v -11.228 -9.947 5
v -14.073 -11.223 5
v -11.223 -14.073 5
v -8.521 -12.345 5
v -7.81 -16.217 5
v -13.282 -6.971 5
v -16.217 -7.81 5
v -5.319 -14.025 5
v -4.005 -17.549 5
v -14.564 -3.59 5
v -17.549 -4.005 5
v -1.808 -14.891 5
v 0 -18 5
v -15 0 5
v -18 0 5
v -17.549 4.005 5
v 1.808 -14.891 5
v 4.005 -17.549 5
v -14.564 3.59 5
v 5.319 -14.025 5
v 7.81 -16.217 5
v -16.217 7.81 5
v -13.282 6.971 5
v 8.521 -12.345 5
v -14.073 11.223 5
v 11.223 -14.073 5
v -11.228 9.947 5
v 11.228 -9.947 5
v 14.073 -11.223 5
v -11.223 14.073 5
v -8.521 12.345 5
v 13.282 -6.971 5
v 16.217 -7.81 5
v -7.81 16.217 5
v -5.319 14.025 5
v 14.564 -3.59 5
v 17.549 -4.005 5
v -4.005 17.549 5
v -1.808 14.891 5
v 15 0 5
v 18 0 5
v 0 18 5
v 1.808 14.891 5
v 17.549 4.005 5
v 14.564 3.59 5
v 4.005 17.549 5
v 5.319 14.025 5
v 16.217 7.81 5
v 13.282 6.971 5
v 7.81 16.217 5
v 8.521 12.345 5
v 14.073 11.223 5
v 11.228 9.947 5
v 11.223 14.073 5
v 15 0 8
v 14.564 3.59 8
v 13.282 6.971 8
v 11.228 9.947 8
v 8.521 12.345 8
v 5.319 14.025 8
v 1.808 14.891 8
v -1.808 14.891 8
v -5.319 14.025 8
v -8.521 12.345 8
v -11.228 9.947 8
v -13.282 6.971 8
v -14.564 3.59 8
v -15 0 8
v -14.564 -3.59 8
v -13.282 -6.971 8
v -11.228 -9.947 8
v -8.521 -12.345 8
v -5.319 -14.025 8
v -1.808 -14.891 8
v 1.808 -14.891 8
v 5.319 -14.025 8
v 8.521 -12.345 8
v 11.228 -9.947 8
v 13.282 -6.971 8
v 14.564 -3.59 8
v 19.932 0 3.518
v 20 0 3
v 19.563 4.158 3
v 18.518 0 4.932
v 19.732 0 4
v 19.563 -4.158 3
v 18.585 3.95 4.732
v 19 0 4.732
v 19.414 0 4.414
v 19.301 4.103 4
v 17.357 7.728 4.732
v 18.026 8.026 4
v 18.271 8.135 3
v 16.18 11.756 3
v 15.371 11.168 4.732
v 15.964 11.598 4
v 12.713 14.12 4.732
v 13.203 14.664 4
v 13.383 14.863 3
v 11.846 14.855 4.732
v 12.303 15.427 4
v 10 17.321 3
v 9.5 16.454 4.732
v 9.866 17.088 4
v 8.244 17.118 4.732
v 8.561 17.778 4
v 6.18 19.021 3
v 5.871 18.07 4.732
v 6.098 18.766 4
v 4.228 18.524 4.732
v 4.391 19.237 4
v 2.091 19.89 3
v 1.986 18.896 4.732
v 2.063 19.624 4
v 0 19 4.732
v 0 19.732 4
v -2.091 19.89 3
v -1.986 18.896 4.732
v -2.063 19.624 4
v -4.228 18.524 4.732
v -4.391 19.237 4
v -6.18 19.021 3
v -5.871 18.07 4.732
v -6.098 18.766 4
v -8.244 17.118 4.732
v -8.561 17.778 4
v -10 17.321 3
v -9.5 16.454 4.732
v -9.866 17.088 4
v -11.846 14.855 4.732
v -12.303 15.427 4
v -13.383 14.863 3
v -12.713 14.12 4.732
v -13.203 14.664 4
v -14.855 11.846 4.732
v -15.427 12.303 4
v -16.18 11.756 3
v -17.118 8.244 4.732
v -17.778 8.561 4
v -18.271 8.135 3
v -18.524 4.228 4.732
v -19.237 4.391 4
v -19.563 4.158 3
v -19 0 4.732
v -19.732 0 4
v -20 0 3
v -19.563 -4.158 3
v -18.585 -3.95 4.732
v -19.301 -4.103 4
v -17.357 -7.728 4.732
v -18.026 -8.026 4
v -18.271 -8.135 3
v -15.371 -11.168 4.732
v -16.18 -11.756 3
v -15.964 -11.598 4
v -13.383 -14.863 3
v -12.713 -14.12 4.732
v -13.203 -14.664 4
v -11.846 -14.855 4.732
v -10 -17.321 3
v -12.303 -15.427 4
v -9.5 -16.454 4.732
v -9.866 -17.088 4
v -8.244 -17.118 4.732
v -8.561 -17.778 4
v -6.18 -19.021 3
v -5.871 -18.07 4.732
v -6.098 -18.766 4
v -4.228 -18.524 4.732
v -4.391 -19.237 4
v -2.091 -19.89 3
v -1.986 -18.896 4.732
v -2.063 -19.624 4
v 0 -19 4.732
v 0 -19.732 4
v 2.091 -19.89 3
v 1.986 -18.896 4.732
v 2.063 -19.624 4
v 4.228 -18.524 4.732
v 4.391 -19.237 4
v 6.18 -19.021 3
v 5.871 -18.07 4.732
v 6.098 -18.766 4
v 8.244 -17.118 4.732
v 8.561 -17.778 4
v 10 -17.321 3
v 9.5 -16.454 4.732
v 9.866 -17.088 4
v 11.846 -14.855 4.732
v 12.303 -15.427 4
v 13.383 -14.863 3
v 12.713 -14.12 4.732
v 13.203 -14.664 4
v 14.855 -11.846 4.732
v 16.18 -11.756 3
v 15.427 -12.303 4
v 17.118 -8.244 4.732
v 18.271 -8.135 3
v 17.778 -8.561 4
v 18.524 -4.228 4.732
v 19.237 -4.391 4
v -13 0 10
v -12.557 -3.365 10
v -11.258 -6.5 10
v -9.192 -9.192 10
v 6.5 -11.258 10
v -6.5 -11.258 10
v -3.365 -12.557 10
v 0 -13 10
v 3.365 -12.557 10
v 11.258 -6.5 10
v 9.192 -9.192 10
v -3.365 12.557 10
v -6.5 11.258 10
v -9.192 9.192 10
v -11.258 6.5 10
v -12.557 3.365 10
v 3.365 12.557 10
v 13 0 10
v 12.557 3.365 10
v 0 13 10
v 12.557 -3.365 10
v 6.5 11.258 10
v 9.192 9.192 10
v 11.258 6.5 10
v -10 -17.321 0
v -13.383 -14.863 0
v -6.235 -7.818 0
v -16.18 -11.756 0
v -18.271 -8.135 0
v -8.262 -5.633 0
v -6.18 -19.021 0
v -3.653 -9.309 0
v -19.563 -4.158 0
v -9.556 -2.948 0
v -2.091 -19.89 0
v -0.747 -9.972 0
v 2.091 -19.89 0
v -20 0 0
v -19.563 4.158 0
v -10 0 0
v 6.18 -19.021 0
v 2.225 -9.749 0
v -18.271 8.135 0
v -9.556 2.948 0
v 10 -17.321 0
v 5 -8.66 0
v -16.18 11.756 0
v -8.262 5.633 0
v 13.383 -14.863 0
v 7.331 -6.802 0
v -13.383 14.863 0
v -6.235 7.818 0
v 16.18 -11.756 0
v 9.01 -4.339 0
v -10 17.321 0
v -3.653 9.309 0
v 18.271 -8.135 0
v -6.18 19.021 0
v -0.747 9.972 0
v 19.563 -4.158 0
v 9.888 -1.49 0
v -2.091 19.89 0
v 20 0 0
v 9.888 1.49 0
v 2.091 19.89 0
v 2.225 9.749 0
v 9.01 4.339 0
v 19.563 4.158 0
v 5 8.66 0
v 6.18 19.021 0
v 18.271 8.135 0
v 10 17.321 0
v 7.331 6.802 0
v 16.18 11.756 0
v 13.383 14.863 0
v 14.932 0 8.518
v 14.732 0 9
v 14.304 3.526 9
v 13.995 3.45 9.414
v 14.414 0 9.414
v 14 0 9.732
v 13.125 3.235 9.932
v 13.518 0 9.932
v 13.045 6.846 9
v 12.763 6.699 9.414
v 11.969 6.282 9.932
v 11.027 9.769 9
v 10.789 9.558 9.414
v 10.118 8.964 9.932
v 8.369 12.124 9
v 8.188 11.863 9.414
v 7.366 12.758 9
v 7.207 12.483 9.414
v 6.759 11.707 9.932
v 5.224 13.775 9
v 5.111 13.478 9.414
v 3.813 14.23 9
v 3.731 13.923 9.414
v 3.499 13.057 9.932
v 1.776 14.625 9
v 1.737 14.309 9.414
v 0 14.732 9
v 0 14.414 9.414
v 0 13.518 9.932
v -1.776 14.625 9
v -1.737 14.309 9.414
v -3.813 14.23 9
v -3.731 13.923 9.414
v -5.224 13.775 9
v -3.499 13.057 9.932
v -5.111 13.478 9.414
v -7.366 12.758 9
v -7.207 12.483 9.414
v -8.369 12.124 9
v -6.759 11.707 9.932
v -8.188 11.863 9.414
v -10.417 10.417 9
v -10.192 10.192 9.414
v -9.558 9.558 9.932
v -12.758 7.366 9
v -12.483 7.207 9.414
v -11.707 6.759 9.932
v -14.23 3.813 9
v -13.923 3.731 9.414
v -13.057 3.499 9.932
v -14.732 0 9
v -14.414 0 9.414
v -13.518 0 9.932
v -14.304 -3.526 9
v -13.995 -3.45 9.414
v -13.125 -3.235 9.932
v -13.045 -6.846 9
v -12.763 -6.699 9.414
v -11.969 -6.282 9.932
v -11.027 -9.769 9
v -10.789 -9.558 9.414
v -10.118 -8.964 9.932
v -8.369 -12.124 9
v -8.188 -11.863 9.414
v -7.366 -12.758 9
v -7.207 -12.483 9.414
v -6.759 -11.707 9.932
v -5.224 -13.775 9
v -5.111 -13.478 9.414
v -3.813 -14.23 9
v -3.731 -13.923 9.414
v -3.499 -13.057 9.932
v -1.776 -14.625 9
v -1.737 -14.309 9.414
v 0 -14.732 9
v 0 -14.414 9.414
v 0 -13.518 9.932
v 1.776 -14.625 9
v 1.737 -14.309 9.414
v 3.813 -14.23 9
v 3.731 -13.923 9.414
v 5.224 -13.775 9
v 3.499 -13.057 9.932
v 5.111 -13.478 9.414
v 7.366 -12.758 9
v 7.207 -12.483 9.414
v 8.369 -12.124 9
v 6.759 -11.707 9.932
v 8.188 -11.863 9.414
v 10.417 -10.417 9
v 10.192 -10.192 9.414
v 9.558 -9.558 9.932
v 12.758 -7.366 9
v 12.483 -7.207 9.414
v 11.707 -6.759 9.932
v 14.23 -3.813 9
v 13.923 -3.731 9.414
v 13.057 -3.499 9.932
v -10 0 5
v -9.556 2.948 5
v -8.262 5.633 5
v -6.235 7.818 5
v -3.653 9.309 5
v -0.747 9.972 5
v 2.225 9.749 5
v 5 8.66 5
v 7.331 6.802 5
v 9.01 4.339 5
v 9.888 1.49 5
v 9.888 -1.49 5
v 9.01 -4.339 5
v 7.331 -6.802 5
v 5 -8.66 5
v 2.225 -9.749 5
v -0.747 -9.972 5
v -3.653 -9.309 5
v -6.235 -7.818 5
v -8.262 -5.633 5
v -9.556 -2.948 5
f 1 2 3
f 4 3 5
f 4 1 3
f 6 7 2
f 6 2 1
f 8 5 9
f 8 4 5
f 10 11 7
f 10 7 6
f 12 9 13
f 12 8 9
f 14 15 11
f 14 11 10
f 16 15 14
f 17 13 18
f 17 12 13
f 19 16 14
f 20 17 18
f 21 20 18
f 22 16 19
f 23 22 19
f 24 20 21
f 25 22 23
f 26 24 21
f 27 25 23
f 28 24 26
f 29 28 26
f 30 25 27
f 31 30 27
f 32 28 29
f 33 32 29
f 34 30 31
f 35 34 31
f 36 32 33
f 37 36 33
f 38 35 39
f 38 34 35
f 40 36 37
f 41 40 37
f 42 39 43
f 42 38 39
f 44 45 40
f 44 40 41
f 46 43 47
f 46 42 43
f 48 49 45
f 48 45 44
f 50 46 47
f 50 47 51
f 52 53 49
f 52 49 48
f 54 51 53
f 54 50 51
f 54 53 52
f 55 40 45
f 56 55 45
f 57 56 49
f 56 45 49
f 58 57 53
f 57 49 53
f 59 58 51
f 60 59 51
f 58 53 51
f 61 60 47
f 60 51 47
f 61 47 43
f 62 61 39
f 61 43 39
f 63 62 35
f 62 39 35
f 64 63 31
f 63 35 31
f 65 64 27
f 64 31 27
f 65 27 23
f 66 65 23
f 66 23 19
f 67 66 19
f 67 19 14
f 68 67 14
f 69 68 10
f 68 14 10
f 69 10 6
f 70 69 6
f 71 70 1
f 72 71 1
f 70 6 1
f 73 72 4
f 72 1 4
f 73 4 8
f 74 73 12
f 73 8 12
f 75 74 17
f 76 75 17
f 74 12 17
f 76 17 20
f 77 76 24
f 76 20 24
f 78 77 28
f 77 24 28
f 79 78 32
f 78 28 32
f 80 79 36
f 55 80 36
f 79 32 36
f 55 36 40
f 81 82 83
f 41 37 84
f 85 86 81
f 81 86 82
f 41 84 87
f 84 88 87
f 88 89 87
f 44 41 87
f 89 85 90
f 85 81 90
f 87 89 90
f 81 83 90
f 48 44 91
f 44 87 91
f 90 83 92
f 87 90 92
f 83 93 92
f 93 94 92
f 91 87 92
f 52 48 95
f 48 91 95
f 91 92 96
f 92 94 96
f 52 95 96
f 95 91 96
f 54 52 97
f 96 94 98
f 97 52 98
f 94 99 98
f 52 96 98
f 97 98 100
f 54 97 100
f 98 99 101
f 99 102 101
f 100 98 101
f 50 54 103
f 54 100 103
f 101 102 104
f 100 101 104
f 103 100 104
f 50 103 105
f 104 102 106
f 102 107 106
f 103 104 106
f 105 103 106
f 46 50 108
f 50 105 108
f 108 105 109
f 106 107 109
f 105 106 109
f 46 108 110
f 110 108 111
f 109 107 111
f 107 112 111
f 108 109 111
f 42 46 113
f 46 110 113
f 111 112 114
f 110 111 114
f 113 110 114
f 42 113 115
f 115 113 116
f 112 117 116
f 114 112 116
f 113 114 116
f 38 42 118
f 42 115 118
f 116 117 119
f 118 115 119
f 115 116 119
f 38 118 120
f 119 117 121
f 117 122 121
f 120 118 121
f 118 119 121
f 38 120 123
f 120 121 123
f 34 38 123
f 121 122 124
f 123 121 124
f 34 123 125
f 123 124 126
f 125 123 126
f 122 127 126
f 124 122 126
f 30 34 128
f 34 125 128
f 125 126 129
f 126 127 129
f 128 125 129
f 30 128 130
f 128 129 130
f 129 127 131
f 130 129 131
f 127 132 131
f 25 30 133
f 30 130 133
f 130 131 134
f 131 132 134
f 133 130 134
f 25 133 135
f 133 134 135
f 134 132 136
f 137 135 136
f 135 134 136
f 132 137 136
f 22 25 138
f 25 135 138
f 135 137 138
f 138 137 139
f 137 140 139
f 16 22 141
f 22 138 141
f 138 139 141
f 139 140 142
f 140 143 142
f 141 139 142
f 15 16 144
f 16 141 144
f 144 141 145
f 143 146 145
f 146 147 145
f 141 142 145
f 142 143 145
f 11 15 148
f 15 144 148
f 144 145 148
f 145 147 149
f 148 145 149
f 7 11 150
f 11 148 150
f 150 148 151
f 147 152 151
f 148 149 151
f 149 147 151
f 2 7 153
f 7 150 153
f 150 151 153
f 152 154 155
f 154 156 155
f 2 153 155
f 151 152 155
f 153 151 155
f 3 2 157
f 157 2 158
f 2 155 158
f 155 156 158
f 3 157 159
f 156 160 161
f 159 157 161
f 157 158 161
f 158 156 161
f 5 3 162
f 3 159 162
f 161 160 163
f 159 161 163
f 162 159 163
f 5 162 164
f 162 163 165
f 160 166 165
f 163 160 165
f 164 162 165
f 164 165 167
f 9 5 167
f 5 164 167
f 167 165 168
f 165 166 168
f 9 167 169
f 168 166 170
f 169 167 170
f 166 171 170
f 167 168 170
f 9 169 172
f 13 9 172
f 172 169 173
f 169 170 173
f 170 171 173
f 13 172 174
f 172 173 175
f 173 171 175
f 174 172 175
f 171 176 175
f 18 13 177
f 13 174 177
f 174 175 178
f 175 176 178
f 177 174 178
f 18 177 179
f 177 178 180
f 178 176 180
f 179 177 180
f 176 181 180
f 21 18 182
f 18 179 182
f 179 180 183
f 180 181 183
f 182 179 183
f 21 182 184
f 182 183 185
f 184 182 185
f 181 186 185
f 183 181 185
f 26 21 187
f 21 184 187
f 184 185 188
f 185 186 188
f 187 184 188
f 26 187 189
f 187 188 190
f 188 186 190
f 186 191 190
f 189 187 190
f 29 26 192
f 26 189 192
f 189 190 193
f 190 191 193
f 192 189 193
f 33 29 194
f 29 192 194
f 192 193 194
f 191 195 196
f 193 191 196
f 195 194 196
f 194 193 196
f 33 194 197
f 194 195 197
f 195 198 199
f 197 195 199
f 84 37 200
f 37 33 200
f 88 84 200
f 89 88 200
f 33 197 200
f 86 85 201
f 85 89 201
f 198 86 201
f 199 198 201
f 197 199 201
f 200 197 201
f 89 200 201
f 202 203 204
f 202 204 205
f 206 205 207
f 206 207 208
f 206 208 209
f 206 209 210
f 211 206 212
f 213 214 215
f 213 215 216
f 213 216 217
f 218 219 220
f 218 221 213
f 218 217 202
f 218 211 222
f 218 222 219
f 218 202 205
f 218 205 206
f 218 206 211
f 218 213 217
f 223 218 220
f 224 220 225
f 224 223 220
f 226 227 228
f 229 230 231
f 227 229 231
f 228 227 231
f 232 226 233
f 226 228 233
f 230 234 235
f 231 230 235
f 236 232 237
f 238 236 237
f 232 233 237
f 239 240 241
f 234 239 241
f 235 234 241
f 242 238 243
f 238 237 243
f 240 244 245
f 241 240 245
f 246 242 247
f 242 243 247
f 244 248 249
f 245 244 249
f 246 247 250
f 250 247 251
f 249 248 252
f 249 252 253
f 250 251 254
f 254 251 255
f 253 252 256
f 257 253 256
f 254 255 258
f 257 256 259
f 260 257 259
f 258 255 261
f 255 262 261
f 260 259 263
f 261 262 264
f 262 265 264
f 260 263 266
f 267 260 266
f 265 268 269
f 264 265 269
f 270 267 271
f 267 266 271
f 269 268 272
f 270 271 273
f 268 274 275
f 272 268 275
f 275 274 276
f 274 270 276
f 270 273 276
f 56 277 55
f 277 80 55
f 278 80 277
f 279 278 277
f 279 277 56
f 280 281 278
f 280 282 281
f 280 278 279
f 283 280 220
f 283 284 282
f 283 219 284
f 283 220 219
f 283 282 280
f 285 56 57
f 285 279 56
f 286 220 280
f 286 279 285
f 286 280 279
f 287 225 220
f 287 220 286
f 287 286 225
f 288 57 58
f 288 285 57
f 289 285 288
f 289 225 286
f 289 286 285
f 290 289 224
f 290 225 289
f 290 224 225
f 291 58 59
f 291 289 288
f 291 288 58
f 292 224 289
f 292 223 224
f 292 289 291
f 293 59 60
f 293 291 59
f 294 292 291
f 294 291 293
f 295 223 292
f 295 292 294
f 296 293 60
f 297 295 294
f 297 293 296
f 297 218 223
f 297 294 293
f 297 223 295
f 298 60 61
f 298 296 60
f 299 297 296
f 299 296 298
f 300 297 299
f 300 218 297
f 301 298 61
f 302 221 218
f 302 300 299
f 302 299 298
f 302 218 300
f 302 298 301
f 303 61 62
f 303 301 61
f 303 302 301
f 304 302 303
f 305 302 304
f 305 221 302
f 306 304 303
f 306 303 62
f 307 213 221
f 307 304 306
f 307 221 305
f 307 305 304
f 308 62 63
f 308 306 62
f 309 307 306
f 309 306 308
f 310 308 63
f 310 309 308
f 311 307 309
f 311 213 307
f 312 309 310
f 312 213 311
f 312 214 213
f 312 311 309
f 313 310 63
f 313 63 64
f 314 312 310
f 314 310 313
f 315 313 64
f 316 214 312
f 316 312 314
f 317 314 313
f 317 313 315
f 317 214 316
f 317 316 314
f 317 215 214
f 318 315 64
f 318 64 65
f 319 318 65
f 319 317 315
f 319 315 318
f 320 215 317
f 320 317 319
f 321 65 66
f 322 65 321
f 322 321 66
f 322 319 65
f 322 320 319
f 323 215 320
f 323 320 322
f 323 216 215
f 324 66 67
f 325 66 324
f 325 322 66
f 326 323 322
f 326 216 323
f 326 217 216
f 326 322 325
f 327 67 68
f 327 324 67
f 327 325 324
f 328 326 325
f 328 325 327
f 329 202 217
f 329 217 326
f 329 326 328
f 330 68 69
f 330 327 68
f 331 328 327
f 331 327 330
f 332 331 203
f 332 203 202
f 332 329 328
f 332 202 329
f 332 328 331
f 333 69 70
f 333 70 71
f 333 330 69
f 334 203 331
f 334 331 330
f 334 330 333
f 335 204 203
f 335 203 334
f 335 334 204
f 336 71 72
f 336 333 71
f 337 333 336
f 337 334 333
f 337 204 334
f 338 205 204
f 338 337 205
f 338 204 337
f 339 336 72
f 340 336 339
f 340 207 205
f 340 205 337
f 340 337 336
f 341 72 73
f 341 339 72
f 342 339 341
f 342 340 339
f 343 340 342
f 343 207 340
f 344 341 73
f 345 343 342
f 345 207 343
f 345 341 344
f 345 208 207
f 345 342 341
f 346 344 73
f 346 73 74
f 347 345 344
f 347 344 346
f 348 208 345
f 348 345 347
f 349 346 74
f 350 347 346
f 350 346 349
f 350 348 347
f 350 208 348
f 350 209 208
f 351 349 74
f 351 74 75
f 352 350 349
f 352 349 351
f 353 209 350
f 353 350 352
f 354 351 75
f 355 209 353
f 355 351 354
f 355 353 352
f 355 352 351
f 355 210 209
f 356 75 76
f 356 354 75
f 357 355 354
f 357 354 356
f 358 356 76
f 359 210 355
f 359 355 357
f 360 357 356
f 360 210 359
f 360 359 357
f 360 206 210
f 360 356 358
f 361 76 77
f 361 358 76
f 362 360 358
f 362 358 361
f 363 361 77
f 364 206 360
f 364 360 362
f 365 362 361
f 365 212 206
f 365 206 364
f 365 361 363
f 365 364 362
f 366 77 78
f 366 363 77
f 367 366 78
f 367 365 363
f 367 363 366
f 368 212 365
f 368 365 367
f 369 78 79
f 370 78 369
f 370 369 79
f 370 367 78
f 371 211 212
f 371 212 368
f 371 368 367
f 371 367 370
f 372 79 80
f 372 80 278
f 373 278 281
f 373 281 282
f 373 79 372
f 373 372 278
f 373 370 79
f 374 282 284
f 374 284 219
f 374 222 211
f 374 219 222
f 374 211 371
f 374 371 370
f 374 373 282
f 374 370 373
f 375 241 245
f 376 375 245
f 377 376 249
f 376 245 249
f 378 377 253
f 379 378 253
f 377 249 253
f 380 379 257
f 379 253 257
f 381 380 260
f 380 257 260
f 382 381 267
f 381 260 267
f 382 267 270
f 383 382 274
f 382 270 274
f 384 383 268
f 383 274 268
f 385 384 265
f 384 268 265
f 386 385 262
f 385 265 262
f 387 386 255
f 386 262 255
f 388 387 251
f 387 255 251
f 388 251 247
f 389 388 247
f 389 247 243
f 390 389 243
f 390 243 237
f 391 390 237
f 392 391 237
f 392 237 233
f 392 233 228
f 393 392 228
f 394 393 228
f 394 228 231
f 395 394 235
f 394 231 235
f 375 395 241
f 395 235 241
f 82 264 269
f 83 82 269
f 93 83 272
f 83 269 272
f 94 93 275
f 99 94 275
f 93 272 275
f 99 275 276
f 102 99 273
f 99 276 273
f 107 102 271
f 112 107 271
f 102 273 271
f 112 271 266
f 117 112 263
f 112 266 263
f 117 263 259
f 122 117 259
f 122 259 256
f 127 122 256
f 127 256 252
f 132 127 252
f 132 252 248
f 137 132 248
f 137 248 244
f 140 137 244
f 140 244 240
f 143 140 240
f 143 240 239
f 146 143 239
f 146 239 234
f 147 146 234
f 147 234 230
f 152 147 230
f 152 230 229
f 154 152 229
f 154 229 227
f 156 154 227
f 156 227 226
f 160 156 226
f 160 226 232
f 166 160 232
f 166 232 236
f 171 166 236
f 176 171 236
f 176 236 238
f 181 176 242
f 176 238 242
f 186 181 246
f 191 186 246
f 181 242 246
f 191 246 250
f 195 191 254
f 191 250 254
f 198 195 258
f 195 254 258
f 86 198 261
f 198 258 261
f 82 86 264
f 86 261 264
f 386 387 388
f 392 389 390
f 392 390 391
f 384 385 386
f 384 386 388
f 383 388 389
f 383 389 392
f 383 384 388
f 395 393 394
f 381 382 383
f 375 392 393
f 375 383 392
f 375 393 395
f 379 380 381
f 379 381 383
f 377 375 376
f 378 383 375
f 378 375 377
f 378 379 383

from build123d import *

# Parameters (mm, degrees)
SKETCH_1_R          = 20
EXTRUDE_1_DEPTH     = 10
SKETCH_2_R          = 10
CUT_EXTRUDE_1_DEPTH = 5
CUT_EXTRUDE_START   = -5
SKETCH_3_R          = 20
SKETCH_3_R_2        = 15
CUT_EXTRUDE_3_DEPTH = 5
FILLET_1_R          = 2
FILLET_2_R          = 2


with BuildPart() as part:
    # 草图1 → 凸台-拉伸1 (new body)
    with BuildSketch(Plane.XY):
        Circle(SKETCH_1_R)
    extrude(amount=EXTRUDE_1_DEPTH)

    # 草图2 → 切除-拉伸1 (cut)
    with BuildSketch(Plane(origin=(0, 0, 0), x_dir=(-1, 0, 0), z_dir=(0, 0, -1))):
        Circle(SKETCH_2_R)
    extrude(amount=-CUT_EXTRUDE_1_DEPTH, mode=Mode.SUBTRACT)

    # 草图3 → 切除-拉伸3 (cut)
    with BuildSketch(Plane.XY.offset(10).offset(CUT_EXTRUDE_START)):
        Circle(SKETCH_3_R)
        Circle(SKETCH_3_R_2, mode=Mode.SUBTRACT)
    extrude(amount=CUT_EXTRUDE_3_DEPTH, mode=Mode.SUBTRACT)

    # 圆角1
    fillet_1_edges = [part.edges().sort_by_distance(p)[0] for p in [
        (-15, 0, 10),
    ]]
    fillet(fillet_1_edges, radius=FILLET_1_R)

    # 圆角2
    fillet_2_edges = [part.edges().sort_by_distance(p)[0] for p in [
        (-20, 0, 5),
    ]]
    fillet(fillet_2_edges, radius=FILLET_2_R)


solid = part.part
